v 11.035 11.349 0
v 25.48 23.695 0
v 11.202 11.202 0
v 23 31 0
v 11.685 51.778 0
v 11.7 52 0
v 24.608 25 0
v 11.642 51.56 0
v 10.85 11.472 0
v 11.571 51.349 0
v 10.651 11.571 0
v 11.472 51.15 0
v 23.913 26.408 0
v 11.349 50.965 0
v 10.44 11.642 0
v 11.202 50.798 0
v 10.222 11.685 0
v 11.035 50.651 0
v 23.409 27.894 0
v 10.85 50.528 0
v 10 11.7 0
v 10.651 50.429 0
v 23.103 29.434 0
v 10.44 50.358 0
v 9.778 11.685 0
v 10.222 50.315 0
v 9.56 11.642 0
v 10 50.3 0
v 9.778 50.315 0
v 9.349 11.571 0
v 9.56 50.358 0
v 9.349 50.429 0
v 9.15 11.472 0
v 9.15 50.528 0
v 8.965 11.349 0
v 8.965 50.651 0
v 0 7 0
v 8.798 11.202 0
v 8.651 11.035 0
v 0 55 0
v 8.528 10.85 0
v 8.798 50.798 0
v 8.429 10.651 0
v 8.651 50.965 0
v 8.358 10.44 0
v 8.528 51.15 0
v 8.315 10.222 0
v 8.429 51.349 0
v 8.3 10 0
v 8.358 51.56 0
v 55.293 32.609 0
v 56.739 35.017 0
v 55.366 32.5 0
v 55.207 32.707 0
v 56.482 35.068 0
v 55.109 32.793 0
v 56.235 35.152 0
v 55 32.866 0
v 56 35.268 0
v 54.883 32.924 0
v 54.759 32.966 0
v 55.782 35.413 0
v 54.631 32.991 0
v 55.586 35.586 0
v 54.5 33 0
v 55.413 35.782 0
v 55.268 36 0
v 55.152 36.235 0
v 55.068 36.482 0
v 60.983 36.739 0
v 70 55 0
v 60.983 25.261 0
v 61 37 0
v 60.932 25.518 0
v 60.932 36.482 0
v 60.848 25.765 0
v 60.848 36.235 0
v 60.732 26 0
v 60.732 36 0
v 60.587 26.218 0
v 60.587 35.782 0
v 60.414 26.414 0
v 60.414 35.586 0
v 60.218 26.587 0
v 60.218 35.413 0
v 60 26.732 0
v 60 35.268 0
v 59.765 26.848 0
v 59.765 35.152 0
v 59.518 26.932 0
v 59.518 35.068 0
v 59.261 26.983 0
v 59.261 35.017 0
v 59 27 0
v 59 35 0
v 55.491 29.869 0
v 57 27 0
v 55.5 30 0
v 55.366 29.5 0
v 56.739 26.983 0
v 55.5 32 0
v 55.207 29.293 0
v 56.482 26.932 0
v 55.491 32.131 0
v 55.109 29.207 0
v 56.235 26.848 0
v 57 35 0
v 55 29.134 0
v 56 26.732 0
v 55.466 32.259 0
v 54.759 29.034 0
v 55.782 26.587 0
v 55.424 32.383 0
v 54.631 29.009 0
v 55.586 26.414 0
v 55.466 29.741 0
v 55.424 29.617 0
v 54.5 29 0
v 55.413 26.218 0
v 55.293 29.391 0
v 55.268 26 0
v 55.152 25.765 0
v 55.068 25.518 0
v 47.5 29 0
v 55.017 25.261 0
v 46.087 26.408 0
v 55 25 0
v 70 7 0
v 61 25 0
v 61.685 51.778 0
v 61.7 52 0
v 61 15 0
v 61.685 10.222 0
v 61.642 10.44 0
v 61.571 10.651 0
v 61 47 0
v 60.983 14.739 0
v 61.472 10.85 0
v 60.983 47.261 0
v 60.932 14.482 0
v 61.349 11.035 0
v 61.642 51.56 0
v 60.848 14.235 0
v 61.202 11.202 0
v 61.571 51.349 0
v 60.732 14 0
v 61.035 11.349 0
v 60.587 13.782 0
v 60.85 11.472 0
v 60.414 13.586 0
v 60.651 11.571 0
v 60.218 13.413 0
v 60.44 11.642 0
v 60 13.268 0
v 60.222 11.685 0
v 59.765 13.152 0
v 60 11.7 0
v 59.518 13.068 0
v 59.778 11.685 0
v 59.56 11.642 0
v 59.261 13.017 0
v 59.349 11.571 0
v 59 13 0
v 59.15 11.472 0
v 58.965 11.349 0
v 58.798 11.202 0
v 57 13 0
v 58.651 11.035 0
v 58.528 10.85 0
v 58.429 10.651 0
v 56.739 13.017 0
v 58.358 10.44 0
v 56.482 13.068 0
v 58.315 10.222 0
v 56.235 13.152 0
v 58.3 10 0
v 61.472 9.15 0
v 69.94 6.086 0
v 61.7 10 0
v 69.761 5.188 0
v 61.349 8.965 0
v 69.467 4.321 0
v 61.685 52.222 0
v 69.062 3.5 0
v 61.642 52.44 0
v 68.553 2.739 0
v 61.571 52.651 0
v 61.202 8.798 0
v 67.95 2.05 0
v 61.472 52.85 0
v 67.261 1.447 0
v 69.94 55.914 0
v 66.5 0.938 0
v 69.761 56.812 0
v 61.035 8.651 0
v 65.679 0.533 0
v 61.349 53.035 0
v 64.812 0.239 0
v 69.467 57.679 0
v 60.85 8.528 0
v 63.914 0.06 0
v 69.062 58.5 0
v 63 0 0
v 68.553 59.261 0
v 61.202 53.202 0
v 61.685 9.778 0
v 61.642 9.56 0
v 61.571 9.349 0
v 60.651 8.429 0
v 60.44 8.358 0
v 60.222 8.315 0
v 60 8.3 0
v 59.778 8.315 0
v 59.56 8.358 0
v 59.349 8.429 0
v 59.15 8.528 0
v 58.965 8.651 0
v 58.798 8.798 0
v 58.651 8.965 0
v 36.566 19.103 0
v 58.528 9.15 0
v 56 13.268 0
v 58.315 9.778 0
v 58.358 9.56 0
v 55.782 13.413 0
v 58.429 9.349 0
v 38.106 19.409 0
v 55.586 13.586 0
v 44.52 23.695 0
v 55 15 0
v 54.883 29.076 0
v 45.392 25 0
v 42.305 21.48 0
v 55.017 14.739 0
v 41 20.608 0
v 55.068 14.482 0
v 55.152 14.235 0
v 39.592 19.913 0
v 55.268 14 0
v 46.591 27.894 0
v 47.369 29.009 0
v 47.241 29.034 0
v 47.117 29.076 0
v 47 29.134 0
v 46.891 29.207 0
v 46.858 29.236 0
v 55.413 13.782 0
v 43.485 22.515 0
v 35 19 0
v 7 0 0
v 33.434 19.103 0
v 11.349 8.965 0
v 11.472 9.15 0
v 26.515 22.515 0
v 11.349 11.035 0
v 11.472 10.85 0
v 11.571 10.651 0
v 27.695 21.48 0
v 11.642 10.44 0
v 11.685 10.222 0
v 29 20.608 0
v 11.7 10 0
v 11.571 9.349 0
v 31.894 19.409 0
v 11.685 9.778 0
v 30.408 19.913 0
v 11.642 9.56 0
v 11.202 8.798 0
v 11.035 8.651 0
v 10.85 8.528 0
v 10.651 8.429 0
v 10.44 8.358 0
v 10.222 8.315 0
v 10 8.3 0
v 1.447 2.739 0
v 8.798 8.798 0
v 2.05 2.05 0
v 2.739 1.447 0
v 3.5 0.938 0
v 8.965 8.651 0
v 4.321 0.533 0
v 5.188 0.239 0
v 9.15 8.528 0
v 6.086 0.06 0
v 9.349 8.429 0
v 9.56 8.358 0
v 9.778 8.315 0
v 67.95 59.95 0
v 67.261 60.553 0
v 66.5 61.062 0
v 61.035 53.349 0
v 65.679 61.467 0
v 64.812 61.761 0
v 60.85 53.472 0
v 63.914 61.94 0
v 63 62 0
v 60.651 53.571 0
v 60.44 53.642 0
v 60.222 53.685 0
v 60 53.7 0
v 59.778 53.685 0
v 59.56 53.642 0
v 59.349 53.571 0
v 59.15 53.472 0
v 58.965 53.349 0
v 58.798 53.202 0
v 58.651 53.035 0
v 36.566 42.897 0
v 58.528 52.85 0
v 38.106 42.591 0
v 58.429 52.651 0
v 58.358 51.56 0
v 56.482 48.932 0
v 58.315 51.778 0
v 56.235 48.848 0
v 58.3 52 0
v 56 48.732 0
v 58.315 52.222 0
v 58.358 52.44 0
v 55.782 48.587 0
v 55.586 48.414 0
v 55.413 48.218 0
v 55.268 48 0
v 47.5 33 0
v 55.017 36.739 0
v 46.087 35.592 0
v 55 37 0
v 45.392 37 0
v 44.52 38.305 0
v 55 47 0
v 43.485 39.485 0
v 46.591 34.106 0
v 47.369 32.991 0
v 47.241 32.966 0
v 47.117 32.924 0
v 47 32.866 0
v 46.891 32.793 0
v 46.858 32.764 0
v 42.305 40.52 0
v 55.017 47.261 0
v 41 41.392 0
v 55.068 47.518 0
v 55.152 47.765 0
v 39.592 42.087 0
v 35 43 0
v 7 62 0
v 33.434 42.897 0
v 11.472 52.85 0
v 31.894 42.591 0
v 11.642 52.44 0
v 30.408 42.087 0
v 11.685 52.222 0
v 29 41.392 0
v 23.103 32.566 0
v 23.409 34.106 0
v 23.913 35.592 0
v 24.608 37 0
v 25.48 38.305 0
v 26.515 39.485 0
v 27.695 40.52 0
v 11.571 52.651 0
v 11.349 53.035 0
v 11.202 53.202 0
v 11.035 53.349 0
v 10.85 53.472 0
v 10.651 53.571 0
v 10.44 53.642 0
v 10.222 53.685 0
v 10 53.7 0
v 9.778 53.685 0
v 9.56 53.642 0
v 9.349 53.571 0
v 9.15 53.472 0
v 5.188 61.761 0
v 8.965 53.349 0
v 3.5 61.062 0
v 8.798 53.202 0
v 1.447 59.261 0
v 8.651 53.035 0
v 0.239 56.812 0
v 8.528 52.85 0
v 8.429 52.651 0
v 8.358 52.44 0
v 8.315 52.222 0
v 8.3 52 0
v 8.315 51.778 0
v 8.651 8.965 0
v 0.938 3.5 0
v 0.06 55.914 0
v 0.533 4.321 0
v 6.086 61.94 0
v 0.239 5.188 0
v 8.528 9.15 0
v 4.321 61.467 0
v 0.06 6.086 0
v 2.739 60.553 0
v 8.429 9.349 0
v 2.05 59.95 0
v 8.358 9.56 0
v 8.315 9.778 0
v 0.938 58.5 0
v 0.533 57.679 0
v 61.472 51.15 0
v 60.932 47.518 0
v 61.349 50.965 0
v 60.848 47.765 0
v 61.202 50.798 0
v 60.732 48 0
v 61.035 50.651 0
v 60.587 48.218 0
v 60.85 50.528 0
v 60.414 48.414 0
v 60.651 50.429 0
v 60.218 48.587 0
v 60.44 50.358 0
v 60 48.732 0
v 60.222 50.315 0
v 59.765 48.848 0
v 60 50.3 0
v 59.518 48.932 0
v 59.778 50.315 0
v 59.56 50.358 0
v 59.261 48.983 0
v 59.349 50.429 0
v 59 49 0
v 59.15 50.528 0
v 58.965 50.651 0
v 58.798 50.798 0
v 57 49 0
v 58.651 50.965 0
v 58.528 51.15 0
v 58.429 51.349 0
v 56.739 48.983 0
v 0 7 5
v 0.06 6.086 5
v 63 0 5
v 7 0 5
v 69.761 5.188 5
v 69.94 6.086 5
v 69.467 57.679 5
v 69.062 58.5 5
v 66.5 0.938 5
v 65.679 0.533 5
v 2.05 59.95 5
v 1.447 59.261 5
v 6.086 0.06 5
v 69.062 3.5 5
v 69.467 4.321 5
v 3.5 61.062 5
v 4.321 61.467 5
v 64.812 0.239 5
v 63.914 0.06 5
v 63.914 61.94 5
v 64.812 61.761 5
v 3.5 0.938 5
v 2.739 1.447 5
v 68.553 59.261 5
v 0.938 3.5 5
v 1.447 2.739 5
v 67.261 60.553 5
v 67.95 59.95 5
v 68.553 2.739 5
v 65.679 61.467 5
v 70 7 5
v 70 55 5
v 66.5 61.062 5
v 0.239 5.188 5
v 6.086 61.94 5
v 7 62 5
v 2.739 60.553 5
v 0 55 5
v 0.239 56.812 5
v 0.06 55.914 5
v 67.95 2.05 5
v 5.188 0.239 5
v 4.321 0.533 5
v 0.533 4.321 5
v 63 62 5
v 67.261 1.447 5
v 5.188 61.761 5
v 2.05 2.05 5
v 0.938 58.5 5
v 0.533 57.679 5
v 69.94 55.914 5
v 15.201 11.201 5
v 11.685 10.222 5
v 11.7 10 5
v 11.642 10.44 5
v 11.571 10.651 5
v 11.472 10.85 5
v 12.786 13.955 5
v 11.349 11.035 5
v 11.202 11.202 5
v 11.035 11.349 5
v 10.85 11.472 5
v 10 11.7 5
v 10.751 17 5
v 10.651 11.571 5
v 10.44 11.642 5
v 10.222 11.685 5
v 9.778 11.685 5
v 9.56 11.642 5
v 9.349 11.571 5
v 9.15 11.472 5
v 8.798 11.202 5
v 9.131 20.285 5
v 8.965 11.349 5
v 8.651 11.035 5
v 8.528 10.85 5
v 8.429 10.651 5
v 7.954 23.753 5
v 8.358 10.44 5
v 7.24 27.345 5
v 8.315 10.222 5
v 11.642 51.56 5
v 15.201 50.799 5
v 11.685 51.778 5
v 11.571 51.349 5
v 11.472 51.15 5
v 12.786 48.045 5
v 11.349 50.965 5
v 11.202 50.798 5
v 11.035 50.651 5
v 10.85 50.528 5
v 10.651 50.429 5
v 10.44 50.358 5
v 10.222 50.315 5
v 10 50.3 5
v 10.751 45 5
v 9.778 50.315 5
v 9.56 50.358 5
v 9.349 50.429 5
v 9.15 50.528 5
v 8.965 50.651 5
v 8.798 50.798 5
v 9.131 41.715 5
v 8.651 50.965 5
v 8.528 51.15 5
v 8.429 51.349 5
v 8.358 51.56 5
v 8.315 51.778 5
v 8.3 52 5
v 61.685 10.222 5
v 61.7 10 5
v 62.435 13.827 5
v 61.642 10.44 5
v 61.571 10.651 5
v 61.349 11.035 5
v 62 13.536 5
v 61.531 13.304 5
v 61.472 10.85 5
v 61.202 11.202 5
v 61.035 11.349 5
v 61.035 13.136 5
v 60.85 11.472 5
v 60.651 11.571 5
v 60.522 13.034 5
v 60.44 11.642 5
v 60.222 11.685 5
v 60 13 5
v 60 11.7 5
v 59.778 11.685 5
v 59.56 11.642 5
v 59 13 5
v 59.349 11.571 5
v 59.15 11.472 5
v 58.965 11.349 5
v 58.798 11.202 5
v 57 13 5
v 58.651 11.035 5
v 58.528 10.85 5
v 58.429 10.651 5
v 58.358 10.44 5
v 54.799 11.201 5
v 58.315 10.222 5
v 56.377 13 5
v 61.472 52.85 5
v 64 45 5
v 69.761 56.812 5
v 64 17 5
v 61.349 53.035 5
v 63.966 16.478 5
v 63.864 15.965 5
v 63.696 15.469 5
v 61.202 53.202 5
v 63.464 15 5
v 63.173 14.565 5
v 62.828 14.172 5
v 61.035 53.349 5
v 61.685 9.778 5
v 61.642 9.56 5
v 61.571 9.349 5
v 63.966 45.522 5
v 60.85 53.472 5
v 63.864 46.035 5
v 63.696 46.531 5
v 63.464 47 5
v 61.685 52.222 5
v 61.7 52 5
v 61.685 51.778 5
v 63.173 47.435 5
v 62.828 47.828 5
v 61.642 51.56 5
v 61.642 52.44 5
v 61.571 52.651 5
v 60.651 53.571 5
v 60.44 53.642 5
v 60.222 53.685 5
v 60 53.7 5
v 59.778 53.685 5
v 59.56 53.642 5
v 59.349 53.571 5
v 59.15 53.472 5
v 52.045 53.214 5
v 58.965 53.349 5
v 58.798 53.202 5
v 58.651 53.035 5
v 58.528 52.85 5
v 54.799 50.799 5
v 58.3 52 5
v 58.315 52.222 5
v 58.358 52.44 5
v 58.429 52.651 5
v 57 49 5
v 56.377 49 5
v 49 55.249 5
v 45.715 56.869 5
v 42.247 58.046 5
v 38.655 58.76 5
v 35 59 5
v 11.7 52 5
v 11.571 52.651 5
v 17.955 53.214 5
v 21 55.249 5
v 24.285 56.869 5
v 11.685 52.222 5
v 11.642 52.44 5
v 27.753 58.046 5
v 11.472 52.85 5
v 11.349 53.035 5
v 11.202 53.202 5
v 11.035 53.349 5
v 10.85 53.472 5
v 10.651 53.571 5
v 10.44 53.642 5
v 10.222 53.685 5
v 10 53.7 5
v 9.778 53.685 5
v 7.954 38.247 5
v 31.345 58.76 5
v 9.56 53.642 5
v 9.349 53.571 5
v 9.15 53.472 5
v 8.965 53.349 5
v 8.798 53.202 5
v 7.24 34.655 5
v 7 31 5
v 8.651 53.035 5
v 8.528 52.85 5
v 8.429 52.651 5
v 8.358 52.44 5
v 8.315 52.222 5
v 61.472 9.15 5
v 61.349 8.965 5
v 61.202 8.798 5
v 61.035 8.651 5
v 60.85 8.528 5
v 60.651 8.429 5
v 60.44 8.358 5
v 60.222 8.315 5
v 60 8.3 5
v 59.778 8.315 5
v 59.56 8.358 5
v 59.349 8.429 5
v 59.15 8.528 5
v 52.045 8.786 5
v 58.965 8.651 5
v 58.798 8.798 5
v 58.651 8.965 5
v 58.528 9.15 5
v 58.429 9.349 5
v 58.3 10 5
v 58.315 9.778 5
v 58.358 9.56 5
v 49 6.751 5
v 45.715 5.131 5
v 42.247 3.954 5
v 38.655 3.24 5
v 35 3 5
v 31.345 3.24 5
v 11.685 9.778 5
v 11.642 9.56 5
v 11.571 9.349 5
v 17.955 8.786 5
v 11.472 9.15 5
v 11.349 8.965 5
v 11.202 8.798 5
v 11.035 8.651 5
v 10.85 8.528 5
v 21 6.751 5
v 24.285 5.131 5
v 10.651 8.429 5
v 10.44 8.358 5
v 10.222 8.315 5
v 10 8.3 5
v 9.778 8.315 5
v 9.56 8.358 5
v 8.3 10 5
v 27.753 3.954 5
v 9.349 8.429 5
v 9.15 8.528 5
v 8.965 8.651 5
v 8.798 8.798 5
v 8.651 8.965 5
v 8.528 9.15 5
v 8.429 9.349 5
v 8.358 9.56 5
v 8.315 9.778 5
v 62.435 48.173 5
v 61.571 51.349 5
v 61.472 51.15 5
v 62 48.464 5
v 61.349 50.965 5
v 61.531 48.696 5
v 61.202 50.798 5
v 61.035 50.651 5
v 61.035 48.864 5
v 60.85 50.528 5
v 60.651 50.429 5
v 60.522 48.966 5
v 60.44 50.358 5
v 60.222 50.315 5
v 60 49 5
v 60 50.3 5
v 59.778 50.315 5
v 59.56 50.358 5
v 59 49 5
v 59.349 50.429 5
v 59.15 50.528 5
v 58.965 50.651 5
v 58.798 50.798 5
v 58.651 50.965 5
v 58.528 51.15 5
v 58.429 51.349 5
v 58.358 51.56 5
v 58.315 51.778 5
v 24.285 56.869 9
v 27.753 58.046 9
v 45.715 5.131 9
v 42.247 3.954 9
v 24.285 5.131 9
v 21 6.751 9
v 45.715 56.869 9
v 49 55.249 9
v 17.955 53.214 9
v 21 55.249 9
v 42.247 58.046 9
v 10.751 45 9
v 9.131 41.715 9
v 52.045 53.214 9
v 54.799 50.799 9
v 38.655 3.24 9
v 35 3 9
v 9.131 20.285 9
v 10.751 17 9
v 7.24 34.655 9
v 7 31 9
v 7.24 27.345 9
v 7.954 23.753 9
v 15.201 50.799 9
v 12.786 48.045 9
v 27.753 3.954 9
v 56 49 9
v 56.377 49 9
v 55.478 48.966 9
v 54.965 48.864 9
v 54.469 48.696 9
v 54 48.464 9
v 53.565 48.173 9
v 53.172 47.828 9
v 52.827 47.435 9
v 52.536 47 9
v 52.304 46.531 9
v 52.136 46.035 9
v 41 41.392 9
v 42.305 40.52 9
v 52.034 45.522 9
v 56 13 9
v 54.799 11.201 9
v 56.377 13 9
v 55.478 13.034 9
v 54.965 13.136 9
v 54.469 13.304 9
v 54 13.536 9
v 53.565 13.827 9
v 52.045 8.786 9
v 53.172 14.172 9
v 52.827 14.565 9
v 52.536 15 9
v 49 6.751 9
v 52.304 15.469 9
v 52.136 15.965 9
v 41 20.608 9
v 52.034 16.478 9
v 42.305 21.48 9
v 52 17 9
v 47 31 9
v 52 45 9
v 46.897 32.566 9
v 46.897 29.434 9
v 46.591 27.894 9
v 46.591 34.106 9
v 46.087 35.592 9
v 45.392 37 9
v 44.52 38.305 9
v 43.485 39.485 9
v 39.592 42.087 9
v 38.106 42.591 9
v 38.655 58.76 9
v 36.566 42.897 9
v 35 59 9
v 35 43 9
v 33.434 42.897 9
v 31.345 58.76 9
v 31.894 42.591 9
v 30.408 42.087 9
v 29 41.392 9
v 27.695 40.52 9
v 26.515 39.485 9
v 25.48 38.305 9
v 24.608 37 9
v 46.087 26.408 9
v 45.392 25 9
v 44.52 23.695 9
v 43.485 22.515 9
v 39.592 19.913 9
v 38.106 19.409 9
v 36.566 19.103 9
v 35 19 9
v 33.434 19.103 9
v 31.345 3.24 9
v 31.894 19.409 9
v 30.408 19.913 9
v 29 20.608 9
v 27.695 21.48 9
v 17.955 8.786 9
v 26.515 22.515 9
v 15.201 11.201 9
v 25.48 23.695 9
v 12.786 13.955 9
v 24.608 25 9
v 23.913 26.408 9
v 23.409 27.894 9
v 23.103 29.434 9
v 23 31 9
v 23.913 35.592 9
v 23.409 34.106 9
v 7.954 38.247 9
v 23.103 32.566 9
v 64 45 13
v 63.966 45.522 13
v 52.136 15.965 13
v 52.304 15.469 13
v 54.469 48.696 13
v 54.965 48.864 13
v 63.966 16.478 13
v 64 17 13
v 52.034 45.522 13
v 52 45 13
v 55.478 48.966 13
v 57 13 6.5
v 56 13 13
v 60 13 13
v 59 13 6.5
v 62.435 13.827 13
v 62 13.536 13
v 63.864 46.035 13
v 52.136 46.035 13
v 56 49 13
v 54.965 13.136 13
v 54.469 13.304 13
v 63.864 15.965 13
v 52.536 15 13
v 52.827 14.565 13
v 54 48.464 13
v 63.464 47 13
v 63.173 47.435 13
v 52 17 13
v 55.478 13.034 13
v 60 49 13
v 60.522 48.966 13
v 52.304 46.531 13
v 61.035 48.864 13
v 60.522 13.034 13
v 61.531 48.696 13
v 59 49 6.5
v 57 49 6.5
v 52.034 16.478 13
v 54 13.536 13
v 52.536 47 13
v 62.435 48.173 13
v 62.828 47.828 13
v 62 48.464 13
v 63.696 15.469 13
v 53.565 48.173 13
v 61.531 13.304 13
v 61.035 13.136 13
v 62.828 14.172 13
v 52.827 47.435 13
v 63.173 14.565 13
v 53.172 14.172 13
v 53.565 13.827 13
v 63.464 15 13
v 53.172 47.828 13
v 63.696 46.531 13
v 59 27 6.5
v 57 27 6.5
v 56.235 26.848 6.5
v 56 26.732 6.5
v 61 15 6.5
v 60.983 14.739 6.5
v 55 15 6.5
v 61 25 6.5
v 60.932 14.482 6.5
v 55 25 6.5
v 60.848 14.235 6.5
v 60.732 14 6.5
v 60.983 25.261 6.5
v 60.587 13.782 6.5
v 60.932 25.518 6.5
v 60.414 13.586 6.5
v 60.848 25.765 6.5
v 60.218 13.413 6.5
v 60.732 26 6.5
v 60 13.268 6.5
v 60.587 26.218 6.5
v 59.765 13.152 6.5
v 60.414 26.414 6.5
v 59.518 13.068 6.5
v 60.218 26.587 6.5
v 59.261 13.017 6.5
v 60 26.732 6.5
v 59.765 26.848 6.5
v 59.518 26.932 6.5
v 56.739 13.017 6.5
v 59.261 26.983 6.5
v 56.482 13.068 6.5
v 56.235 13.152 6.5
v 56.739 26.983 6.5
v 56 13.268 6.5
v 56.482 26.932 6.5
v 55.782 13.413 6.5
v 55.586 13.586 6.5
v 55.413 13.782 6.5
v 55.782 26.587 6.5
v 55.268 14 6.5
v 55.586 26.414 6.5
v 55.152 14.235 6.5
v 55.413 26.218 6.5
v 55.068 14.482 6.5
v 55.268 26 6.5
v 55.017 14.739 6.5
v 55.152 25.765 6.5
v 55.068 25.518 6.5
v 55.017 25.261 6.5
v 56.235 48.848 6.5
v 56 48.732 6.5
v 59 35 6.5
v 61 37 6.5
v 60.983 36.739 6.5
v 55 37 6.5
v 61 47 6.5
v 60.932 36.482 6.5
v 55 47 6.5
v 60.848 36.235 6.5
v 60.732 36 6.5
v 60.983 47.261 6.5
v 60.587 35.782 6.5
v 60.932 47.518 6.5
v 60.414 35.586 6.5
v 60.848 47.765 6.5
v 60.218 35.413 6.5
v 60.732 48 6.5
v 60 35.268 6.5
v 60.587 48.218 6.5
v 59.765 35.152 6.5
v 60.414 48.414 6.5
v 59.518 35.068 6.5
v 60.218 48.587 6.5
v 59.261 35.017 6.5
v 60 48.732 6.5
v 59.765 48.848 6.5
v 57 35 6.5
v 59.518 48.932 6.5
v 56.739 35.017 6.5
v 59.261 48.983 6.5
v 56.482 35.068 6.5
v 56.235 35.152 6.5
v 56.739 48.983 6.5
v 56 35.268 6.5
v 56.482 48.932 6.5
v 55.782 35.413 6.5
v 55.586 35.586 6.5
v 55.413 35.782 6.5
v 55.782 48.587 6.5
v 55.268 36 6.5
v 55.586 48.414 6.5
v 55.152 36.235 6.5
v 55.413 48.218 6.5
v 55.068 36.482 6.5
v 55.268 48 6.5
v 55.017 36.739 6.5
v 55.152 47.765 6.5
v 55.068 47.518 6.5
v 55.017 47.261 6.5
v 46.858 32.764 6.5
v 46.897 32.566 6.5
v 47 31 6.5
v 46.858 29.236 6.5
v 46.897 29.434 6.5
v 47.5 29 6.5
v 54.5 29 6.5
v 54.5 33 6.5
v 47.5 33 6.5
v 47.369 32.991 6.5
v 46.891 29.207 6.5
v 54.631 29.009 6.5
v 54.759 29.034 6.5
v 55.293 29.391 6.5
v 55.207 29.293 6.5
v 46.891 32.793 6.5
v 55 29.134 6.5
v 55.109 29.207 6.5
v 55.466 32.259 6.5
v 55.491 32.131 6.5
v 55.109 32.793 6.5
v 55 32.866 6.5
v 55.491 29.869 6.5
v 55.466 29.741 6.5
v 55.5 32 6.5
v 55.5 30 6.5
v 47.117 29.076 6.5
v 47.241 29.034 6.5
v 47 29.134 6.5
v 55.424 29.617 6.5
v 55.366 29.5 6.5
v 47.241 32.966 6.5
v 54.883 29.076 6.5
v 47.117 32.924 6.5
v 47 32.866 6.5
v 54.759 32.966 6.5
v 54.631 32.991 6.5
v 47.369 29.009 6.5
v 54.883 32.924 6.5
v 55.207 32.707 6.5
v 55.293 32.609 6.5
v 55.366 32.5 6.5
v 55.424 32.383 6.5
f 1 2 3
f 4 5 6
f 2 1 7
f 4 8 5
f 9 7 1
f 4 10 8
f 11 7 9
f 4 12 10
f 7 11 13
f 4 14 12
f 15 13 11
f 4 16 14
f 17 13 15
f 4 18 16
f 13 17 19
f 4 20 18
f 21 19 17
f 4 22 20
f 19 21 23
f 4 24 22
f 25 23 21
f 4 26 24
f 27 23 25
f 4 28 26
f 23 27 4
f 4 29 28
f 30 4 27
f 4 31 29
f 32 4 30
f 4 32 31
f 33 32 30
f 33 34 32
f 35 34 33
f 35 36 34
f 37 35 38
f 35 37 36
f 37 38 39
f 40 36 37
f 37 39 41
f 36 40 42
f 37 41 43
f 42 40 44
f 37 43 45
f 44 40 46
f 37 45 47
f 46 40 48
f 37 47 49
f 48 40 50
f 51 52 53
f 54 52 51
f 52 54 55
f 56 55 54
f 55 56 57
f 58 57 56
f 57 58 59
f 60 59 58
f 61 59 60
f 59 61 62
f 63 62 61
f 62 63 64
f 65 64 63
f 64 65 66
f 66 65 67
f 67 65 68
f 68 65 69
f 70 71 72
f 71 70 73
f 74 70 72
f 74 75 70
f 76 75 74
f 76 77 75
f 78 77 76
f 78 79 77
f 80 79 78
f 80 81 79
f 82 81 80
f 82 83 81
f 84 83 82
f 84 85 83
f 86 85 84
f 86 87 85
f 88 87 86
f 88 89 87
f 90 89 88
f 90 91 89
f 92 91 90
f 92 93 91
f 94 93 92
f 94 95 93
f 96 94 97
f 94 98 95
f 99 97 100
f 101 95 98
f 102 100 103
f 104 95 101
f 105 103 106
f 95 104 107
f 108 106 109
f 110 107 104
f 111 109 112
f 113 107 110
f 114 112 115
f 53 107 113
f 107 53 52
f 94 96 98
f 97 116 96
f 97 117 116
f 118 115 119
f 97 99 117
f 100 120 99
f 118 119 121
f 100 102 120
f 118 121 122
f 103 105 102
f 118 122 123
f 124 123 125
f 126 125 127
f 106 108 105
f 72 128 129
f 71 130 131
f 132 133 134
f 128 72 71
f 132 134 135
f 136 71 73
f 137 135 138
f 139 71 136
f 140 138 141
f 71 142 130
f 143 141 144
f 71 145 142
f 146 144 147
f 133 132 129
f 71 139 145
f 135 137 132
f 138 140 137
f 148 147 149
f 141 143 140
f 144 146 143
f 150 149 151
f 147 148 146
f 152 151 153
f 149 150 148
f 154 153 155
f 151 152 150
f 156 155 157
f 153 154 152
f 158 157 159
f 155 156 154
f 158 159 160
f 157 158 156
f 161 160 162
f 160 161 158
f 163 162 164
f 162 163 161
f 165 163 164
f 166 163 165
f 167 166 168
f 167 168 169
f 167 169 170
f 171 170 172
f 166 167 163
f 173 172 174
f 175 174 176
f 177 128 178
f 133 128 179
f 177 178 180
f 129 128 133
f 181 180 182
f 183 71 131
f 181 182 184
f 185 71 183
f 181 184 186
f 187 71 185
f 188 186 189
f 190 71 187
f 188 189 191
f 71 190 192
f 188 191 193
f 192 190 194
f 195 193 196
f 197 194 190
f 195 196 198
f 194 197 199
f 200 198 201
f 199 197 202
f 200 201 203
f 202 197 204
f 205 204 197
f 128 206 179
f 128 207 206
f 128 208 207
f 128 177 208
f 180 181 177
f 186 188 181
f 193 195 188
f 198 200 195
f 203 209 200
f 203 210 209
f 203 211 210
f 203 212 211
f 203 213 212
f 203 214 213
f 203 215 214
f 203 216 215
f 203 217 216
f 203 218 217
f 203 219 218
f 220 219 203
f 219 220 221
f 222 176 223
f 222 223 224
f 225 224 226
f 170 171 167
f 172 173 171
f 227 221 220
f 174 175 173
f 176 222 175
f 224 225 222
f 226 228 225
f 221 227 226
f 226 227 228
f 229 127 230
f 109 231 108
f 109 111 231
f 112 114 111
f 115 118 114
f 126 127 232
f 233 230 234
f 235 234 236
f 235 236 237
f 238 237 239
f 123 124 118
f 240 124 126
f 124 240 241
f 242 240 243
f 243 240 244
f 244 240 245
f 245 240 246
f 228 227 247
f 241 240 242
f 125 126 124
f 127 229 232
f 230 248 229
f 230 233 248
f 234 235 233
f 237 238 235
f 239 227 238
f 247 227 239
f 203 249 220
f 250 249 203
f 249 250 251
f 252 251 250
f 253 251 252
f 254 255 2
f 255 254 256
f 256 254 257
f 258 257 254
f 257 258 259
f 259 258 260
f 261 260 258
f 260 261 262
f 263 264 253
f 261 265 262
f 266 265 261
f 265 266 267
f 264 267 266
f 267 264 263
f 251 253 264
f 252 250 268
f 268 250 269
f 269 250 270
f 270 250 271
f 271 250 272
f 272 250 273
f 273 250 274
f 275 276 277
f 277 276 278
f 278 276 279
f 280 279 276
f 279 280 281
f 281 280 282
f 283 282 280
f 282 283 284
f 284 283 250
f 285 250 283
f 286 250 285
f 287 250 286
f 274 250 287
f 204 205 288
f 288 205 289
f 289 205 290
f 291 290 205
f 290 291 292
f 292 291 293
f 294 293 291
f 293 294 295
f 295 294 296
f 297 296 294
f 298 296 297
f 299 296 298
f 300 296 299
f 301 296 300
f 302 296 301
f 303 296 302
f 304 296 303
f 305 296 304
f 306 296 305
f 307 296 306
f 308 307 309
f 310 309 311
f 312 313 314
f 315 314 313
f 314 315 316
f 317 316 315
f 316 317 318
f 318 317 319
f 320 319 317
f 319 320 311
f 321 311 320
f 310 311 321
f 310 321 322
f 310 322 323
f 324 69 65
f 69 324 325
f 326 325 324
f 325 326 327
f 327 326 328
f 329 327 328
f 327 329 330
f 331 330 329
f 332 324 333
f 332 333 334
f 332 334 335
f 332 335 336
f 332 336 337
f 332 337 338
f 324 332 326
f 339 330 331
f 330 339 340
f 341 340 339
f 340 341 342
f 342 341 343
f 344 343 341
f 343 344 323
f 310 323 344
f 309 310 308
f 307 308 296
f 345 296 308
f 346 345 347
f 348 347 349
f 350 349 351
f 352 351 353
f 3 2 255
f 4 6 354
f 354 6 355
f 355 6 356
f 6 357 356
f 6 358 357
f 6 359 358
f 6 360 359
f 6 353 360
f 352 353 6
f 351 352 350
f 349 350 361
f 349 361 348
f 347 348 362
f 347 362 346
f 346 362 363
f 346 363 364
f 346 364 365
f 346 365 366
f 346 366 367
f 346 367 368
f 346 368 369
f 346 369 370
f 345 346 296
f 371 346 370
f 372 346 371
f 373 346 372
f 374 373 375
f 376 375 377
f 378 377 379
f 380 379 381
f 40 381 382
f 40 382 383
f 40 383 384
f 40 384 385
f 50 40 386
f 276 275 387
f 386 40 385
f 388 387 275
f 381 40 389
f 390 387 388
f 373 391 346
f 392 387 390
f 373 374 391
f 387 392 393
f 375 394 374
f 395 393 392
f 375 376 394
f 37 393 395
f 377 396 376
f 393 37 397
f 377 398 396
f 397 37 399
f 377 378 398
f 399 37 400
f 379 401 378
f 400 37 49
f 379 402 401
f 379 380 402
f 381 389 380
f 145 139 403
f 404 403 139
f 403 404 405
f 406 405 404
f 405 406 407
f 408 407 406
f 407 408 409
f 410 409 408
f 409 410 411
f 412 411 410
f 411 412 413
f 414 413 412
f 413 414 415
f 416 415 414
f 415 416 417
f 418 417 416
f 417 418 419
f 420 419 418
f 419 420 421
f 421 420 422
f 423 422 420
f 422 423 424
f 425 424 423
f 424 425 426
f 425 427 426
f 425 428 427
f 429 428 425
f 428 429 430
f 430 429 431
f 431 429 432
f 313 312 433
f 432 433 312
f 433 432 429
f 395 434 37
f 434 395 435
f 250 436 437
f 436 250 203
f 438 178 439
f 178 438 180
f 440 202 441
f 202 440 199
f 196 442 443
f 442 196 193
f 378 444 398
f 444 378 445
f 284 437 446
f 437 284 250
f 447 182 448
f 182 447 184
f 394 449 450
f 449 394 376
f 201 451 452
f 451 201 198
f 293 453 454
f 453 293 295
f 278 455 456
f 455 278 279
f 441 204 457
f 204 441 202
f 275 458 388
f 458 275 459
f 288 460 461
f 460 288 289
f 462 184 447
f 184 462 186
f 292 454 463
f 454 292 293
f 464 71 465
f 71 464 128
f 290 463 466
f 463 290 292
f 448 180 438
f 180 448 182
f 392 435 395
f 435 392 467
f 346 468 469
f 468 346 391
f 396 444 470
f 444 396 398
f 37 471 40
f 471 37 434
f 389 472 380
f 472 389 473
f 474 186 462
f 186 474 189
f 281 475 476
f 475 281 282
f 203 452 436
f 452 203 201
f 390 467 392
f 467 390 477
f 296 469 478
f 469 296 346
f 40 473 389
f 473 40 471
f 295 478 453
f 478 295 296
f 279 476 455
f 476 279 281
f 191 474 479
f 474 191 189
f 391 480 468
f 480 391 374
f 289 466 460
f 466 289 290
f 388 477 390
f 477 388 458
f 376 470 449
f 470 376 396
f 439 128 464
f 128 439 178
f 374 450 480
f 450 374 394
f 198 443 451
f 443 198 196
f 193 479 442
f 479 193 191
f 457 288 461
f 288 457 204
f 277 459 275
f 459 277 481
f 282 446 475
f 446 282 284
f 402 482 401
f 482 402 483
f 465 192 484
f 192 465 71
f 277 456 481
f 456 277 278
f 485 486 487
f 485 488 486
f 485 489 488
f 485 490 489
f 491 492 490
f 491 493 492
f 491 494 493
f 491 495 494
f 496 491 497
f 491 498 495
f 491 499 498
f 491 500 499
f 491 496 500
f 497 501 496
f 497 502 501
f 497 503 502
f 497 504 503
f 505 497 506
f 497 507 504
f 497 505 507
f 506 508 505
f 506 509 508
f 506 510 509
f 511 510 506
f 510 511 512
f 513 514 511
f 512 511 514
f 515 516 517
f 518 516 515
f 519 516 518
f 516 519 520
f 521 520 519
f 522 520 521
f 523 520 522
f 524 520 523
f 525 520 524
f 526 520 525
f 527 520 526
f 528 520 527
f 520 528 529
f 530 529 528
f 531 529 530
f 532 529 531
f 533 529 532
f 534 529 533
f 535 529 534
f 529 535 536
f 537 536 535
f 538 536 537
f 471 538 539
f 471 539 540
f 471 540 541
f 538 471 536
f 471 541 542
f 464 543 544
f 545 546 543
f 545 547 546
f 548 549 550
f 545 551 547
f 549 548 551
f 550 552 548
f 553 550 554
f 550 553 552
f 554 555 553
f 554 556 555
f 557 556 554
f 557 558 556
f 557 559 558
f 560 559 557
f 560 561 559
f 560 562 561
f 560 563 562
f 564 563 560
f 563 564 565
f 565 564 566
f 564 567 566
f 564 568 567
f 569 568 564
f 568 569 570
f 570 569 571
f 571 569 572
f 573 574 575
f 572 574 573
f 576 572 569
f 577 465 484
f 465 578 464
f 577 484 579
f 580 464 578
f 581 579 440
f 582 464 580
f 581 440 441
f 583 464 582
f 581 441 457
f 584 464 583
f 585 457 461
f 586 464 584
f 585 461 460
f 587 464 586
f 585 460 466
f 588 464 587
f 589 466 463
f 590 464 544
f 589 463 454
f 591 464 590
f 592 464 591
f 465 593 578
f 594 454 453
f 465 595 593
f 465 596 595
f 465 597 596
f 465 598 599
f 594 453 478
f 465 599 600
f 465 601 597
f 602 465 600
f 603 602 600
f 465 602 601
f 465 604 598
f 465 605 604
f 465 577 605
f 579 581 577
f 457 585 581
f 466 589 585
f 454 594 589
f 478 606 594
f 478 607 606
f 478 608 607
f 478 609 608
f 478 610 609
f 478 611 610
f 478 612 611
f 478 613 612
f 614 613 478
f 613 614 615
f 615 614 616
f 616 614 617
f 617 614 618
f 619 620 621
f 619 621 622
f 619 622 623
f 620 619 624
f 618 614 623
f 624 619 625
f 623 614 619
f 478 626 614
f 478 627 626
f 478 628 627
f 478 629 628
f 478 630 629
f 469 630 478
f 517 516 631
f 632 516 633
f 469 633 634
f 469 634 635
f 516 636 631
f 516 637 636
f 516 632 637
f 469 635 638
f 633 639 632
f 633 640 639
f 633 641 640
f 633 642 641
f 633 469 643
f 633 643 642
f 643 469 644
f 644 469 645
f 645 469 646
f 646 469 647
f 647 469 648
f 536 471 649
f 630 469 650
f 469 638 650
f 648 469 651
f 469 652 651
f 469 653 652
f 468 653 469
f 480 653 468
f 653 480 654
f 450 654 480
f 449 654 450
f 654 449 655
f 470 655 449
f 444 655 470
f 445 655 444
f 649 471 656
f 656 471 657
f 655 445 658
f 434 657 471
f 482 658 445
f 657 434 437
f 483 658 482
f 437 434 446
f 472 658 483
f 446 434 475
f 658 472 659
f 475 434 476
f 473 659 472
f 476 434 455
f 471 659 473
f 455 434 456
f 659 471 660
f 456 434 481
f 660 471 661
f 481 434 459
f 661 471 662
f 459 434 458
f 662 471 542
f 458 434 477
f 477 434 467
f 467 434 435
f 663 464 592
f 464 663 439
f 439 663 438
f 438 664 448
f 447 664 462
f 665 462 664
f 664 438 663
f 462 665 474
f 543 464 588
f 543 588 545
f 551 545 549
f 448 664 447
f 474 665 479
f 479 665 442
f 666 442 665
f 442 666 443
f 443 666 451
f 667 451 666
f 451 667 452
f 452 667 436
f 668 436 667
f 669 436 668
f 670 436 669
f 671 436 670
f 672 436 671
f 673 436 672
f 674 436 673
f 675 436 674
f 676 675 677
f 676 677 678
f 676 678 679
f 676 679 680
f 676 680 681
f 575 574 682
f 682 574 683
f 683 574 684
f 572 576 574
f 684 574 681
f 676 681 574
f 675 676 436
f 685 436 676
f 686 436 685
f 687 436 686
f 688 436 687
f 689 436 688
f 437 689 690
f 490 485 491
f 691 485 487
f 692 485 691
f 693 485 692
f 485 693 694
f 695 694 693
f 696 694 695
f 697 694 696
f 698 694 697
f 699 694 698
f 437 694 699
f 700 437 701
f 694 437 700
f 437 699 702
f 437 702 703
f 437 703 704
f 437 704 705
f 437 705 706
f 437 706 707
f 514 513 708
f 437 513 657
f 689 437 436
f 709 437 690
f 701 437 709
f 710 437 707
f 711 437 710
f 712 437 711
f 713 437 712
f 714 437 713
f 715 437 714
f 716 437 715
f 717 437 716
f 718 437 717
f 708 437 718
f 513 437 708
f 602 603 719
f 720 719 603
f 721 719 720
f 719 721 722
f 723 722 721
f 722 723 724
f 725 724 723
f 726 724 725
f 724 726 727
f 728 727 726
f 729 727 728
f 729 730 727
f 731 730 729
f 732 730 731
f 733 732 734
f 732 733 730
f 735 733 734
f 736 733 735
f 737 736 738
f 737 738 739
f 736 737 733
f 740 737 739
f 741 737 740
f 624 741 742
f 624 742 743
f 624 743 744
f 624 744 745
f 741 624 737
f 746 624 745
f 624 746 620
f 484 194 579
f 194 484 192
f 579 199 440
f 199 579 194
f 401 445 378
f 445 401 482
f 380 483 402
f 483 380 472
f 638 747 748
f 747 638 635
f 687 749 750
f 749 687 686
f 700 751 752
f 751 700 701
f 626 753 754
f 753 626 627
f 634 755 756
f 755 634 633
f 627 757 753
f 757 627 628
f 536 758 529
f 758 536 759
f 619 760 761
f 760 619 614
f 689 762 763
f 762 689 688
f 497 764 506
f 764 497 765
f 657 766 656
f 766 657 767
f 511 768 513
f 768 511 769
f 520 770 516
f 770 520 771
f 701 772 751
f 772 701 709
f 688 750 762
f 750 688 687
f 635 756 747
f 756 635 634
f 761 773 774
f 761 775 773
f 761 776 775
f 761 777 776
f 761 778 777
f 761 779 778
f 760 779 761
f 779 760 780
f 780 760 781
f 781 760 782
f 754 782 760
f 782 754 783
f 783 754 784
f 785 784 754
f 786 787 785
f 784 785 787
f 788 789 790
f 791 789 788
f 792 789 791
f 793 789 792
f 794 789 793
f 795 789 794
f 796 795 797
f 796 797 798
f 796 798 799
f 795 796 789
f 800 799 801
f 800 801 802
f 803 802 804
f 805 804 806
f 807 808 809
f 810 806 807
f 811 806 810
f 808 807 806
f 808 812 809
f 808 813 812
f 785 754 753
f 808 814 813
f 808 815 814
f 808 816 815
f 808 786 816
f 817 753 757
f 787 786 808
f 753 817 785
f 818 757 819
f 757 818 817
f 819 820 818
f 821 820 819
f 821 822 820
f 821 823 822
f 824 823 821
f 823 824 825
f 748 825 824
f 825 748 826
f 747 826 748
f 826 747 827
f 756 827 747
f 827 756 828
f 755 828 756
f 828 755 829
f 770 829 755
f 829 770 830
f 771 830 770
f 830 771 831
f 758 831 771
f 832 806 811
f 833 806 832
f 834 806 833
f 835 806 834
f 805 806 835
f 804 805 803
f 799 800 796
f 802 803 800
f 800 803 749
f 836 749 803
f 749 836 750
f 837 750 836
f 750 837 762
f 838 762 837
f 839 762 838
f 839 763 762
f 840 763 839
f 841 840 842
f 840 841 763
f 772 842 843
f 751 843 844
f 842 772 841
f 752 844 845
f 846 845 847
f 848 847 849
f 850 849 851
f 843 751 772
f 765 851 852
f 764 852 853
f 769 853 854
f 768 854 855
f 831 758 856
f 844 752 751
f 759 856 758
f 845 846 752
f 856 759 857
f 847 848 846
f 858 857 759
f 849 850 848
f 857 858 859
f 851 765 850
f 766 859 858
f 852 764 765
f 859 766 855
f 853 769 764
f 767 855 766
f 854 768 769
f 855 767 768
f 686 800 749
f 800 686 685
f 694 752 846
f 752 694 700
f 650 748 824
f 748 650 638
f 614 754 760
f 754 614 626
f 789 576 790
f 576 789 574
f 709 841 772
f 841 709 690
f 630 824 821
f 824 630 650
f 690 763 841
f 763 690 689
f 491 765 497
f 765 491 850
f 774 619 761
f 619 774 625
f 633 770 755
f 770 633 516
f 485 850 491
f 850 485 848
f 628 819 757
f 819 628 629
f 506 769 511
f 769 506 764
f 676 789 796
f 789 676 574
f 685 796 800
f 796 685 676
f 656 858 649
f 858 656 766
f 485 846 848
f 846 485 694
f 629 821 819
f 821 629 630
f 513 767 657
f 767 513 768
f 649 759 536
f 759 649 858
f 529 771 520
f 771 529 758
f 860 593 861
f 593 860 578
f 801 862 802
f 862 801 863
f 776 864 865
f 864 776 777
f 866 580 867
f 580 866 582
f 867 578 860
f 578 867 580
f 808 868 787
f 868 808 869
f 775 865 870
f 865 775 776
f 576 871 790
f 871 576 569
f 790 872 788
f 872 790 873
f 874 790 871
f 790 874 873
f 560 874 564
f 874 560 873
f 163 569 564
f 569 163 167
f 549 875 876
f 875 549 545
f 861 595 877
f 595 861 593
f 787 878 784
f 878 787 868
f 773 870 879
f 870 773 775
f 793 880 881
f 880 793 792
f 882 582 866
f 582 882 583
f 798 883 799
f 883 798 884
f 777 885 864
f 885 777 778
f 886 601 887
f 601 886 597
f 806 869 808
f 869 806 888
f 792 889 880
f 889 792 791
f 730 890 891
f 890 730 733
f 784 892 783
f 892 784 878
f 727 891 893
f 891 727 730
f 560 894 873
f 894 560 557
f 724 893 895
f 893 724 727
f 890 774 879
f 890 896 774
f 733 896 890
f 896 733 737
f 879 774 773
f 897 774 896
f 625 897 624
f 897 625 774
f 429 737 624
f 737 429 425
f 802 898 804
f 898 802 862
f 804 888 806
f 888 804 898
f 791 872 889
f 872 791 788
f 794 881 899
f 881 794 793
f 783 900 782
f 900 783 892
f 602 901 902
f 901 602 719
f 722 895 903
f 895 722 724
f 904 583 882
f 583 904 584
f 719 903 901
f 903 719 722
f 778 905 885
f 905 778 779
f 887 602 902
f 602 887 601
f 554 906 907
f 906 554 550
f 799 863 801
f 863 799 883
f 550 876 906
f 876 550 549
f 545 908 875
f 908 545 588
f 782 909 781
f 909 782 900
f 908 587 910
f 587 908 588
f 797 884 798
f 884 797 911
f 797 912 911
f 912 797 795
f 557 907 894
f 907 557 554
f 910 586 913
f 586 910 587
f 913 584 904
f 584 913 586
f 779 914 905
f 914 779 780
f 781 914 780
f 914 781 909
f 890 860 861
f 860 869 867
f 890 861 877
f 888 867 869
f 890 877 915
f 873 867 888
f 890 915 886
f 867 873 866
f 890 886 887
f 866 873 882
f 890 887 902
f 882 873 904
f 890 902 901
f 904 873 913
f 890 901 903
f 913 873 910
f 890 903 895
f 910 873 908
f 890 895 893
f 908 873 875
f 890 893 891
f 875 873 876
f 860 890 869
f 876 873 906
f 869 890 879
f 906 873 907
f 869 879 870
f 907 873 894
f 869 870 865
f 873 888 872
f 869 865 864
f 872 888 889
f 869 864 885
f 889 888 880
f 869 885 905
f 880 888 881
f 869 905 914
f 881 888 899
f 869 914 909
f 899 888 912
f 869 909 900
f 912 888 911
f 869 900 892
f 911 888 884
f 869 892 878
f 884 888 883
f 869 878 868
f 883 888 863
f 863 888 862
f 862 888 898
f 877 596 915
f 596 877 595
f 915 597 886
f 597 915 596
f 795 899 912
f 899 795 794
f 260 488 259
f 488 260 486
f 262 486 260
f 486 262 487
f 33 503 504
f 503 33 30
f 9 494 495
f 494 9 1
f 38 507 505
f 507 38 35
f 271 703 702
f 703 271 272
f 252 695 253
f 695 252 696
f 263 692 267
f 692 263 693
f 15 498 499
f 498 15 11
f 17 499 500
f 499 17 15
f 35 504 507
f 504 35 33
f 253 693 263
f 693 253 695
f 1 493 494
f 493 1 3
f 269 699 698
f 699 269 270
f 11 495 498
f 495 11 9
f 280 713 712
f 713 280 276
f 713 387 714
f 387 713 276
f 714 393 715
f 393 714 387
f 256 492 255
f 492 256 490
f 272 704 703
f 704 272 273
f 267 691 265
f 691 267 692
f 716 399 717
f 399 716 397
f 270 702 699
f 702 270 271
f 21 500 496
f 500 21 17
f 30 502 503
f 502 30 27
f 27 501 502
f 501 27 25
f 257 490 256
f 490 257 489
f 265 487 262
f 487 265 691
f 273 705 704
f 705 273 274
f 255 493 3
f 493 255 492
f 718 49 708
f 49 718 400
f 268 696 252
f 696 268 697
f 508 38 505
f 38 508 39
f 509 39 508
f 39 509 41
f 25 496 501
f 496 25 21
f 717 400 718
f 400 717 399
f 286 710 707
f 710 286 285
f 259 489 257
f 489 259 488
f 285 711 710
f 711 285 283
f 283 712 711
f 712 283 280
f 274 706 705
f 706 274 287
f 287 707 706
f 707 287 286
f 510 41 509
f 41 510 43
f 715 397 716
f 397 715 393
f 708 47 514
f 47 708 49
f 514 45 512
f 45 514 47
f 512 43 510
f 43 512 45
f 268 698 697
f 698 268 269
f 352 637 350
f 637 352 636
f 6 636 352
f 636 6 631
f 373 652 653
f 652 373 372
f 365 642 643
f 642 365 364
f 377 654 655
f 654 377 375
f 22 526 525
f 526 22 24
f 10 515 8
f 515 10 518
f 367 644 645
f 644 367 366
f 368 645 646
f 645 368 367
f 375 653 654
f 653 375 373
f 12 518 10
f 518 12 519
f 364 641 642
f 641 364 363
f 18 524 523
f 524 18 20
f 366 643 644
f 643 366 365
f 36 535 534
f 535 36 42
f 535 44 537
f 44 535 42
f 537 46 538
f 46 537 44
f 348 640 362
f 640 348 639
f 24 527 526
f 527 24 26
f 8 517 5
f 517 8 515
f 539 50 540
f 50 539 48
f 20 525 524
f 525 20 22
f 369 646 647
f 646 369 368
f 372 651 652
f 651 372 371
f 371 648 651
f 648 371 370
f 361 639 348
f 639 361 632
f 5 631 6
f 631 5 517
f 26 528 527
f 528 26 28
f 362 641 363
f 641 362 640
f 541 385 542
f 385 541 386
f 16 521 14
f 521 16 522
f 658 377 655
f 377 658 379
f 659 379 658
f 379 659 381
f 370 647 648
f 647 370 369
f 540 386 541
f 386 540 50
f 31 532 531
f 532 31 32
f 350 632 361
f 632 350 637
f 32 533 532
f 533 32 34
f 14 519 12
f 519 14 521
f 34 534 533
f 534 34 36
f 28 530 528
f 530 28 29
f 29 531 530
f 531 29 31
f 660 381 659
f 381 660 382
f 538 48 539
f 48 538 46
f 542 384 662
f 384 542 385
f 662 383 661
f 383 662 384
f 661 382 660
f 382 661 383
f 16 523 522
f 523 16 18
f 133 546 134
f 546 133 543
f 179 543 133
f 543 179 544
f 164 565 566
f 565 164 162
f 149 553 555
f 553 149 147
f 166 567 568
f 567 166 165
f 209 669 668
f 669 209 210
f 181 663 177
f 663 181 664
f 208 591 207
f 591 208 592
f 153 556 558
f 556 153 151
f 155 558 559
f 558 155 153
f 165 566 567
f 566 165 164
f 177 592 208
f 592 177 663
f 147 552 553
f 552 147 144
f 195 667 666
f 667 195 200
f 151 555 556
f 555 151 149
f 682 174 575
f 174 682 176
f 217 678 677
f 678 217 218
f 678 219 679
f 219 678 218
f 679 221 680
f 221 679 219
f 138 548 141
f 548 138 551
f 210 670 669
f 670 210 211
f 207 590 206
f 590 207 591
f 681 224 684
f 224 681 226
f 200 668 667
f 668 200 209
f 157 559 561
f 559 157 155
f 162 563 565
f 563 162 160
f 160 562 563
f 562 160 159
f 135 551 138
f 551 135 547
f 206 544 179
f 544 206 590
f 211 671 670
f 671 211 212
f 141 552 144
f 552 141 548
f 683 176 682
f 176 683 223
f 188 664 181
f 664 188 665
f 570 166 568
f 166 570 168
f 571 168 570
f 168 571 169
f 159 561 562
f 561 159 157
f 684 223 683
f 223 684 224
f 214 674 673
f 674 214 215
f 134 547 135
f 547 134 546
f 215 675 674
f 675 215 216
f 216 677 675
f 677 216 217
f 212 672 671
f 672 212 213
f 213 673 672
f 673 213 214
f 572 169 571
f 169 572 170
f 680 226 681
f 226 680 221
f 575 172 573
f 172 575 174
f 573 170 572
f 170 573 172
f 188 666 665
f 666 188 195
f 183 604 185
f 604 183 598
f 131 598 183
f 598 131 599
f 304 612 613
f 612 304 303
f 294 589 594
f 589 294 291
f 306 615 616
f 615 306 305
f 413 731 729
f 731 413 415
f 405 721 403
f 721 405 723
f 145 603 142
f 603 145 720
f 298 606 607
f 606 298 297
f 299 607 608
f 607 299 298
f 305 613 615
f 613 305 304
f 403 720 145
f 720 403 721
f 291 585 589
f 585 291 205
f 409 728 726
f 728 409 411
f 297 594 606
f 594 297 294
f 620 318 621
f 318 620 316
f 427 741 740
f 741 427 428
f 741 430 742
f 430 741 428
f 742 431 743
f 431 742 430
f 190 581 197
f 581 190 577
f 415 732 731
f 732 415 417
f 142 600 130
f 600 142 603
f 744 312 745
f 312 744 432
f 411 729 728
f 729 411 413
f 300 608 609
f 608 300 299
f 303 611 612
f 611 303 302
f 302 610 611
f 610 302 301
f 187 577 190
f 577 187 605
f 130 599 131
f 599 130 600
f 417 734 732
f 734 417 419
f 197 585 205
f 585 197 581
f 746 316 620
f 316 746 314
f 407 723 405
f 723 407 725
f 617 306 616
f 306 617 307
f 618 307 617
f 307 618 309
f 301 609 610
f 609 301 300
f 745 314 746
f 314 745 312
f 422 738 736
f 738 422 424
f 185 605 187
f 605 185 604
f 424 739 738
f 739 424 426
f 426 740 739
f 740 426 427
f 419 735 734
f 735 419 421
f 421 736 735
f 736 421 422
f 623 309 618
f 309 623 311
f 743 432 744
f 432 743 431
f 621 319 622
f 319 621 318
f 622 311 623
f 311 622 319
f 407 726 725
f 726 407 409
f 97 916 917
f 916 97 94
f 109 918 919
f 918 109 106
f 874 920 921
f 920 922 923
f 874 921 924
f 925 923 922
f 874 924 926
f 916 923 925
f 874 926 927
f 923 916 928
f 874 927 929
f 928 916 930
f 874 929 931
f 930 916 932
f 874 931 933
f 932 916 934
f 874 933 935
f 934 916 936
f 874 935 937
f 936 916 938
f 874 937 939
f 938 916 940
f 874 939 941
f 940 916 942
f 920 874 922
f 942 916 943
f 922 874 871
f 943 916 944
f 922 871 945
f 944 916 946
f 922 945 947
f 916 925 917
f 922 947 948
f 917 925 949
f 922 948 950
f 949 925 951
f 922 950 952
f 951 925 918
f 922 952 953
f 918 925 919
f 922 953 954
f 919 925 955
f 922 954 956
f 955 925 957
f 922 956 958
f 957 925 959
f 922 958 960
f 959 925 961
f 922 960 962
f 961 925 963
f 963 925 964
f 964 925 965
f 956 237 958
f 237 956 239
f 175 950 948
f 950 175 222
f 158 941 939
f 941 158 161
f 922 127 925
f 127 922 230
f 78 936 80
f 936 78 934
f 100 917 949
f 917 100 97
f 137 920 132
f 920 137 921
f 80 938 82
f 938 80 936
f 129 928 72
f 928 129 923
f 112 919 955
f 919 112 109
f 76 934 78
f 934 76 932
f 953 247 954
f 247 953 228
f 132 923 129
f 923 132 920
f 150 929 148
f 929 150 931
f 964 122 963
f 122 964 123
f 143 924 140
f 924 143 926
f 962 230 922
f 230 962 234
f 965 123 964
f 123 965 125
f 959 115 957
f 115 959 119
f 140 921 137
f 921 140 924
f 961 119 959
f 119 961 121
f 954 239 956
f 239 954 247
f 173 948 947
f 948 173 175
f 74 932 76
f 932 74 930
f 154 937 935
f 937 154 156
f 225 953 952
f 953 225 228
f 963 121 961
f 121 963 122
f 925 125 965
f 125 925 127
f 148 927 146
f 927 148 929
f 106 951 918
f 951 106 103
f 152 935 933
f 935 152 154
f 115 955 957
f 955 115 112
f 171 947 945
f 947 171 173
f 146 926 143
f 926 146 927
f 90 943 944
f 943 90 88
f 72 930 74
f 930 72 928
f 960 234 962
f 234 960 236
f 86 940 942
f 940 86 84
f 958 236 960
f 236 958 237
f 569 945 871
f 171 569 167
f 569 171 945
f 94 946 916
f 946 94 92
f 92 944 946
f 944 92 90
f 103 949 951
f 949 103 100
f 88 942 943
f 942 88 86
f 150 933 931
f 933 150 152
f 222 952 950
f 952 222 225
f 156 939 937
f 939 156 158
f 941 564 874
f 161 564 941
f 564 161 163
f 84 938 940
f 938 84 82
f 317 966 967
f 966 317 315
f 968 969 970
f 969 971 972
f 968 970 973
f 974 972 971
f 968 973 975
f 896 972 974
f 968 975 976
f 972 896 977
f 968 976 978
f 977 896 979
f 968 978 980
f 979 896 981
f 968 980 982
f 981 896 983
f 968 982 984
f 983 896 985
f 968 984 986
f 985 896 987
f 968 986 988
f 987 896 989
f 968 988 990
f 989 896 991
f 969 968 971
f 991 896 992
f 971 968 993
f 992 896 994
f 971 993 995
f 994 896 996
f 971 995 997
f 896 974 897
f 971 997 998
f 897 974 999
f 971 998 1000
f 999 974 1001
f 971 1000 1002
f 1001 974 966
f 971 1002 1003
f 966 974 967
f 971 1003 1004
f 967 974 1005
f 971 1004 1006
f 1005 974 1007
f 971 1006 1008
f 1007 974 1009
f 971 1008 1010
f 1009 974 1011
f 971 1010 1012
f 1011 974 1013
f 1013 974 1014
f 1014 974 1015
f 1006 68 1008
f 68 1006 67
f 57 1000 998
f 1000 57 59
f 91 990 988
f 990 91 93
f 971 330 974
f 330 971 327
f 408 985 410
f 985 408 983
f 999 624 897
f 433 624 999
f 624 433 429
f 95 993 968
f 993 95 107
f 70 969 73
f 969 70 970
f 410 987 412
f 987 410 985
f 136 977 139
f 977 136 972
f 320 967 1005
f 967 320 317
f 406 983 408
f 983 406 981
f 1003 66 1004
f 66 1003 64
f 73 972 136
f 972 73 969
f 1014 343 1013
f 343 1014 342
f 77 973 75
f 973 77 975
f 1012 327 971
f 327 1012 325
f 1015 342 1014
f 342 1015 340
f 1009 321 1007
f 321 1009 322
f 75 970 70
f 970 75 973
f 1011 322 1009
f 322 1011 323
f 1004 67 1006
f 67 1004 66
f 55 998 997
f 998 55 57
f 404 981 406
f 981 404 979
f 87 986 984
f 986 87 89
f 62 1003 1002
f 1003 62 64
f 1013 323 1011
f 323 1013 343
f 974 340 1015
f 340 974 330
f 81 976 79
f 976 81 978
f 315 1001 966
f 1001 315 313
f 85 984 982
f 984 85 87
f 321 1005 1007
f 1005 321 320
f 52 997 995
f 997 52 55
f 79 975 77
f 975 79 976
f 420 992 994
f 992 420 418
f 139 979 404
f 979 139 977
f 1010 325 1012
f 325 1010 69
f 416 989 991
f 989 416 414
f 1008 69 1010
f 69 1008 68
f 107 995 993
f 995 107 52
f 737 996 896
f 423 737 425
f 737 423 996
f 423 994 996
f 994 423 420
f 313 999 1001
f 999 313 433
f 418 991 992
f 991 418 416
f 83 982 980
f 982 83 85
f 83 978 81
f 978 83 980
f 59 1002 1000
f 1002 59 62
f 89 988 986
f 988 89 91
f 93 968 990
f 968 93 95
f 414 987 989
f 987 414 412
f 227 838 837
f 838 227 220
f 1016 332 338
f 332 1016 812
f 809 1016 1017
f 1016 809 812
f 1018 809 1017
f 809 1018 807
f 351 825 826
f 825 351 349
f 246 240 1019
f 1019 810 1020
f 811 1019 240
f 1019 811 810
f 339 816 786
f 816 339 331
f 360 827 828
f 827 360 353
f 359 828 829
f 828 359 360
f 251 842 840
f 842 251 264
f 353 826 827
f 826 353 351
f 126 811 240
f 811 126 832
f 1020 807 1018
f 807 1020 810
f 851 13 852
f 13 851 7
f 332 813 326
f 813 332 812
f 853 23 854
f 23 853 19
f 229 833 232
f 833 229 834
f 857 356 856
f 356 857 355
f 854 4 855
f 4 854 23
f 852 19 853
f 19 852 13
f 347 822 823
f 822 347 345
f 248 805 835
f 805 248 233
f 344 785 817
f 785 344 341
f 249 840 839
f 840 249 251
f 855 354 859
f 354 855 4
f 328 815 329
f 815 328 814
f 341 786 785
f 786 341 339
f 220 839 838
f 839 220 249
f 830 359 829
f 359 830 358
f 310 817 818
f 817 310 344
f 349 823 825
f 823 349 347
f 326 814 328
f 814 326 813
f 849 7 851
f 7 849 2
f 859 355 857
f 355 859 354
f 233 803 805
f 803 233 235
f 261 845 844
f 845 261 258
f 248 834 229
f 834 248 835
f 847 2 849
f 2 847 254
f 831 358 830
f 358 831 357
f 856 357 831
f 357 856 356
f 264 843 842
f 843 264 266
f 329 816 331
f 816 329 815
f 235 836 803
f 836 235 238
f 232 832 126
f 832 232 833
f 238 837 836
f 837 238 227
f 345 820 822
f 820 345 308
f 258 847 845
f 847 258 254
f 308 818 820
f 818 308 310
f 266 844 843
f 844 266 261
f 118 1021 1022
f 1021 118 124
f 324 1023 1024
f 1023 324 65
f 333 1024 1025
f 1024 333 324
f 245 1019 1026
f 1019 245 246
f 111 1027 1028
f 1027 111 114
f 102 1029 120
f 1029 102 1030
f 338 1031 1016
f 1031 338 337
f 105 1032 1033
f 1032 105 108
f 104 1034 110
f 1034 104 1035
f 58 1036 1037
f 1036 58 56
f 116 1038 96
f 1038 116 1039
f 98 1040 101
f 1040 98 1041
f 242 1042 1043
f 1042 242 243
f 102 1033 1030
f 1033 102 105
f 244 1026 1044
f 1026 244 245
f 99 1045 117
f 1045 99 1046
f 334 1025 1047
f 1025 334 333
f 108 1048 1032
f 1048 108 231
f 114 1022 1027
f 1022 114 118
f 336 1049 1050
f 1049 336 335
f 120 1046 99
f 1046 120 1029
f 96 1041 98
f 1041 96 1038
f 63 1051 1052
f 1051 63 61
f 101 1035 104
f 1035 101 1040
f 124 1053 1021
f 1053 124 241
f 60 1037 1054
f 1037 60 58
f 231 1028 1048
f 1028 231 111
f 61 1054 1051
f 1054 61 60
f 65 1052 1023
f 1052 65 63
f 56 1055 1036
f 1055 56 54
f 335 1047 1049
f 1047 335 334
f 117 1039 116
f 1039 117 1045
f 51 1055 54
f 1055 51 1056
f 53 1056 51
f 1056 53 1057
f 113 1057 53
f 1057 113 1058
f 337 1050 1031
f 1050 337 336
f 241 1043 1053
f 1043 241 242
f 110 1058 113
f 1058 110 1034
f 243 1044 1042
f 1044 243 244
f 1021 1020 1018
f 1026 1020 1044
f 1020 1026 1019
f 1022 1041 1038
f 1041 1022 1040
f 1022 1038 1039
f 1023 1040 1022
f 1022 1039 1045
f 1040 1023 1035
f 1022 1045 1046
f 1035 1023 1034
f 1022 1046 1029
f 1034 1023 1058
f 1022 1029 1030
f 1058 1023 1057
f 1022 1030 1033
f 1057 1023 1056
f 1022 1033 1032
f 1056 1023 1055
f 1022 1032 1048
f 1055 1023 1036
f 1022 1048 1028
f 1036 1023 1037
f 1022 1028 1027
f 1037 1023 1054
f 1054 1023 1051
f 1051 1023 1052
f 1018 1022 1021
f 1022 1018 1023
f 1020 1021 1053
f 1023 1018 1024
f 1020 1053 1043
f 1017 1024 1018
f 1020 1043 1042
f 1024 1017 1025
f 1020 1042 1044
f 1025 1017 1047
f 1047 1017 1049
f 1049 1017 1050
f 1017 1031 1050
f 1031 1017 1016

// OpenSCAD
// file: robot_params.scad
// Shared mechanical parameters for Codex house companion CAD v0.
// Units: millimeters.
$fn = 48;

// Body envelope
base_len = 300;
base_w = 220;
base_floor_th = 4;
wall_th = 3;
corner_r = 12;
base_wall_h = 34;
deck_z = 48;
total_body_h = 112;

// Personality / render colors
codex_teal = "#13C8C3";
codex_blue = "#2F6BFF";
codex_cream = "#F5F0E6";
codex_charcoal = "#242832";
codex_lime = "#B9FF66";
codex_orange = "#FF9F1C";
bumper_tpu = "#2B2F3A";

// Drive
wheel_d = 80;
wheel_w = 24;
axle_z = 42;
axle_x = 145;
wheel_clearance = 5;
motor_mount_slot = 5;
motor_pod_len = 72;
motor_pod_w = 36;
motor_pod_h = 46;

// Fasteners
m3_clearance_d = 3.4;
m3_insert_d = 4.8;
m3_insert_depth = 5.7;
m25_clearance_d = 2.8;
m2_clearance_d = 2.3;

// Electronics
pi_len = 85;
pi_w = 56;
pi_mount_x = 58;
pi_mount_y = 49;
hat_keepout_z = 28;
cooling_keepout_z = 18;
deck_th = 4;
deck_offset_x = 18;
deck_offset_y = 14;
deck_mount_x = [24, base_len-60];
deck_mount_y = [20, base_w-62];
deck_boss_x = [deck_offset_x + deck_mount_x[0], deck_offset_x + deck_mount_x[1]];
deck_boss_y = [deck_offset_y + deck_mount_y[0], deck_offset_y + deck_mount_y[1]];
deck_len = base_len - 36;
deck_w = base_w - 42;

// Battery
battery_len = 110;
battery_w = 38;
battery_h = 38;
battery_padding = 3;
strap_slot_w = 8;
strap_slot_len = 46;
battery_cradle_mount_x = [12, battery_len + 2*battery_padding + 2];
battery_cradle_mount_y = [10, battery_w + 2*battery_padding + 2];

// Storage keepout for later USB 3 module
usb_storage_len = 90;
usb_storage_w = 35;
usb_storage_h = 12;
usb_cable_bend_r = 25;

// Sensors and expression
head_z = 205;
mast_h = 120;
mast_w = 38;
mast_d = 32;
head_w = 96;
head_h = 58;
head_d = 46;
camera_board_w = 25;
camera_board_h = 24;
tof_pod_w = 24;
tof_pod_h = 18;
tof_pod_d = 18;
front_sensor_angle = 20;
bumper_travel = 8;
soft_bumper_h = 22;

// Assembly anchors / safety placeholders
battery_cradle_x = 166;
battery_cradle_y = base_w/2 - (battery_w + 2*battery_padding + 12)/2;
motor_pod_anchor_x = [axle_x-28, axle_x+28];
motor_pod_anchor_y = [base_w/2 - 61, base_w/2 + 61];
motor_pod_local_hole_x = [8, 64];
motor_pod_local_hole_y = motor_pod_w/2;
estop_x = base_len - 62;
estop_y = base_w/2;
estop_mount_d = 22;
estop_guard_d = 48;
estop_plate_w = 70;
estop_plate_d = 62;
estop_plate_th = 5;
estop_plate_mount_x = [10, estop_plate_w - 10];
estop_plate_mount_y = [10, estop_plate_d - 10];

// Split-print helpers for common 220 x 220 mm beds
base_split_x = base_len/2;
deck_split_x = deck_len/2;
seam_screw_offset = 14;
base_seam_y = [42, base_w/2, base_w-42];
deck_seam_y = [36, deck_w/2, deck_w-36];
seam_plate_w = 64;
seam_plate_d = 18;
seam_plate_th = 3;

module rounded_box(size=[10,10,10], r=2, center=false) {
  // Lightweight printable rounded rectangle prism using hull of cylinders.
  translate(center ? [-size[0]/2, -size[1]/2, -size[2]/2] : [0,0,0])
  hull() {
    for (x=[r, size[0]-r]) for (y=[r, size[1]-r])
      translate([x,y,0]) cylinder(h=size[2], r=r);
  }
}

module screw_hole(d=m3_clearance_d, h=20) {
  cylinder(h=h, d=d, center=true);
}

module preview_only() {
  if ($preview) children();
}

module insert_boss(d=10, h=8, hole=m3_insert_d) {
  difference() { cylinder(h=h, d=d); translate([0,0,-1]) cylinder(h=h+2, d=hole); }
}
// main file
include <robot_params.scad>

// Reinforced E-stop mount concept. The top shell provides access; this plate
// ties the switch body back to deck standoffs and gives motor-cut wiring relief.
module estop_mount_plate(show_cap=true) {
  color(codex_charcoal)
  difference() {
    union() {
      rounded_box([estop_plate_w, estop_plate_d, estop_plate_th], 7);
      translate([estop_plate_w/2,estop_plate_d/2,estop_plate_th])
        cylinder(h=4, d=estop_guard_d+8);
      translate([estop_plate_w-18,estop_plate_d/2-18,estop_plate_th])
        rounded_box([12,36,8],4);
    }
    translate([estop_plate_w/2,estop_plate_d/2,-1])
      cylinder(h=estop_plate_th+8,d=estop_mount_d+2);
    translate([estop_plate_w/2+estop_mount_d/2+5,estop_plate_d/2,-1])
      rounded_box([9,4,estop_plate_th+10],1,center=true); // anti-rotation notch placeholder
    for (x=estop_plate_mount_x) for (y=estop_plate_mount_y)
      translate([x,y,estop_plate_th/2]) screw_hole(h=20);
    for (y=[estop_plate_d/2-11,estop_plate_d/2+11])
      translate([estop_plate_w-12,y,-1]) rounded_box([6,14,estop_plate_th+10],2,center=true);
  }

  if (show_cap)
    preview_only()
      translate([estop_plate_w/2,estop_plate_d/2,estop_plate_th+4])
        estop_preview_cap();
}

module estop_preview_cap() {
  color("red") union() {
    cylinder(h=12, d=estop_mount_d);
    translate([0,0,12]) cylinder(h=14, d=estop_guard_d);
  }
}

estop_mount_plate();
